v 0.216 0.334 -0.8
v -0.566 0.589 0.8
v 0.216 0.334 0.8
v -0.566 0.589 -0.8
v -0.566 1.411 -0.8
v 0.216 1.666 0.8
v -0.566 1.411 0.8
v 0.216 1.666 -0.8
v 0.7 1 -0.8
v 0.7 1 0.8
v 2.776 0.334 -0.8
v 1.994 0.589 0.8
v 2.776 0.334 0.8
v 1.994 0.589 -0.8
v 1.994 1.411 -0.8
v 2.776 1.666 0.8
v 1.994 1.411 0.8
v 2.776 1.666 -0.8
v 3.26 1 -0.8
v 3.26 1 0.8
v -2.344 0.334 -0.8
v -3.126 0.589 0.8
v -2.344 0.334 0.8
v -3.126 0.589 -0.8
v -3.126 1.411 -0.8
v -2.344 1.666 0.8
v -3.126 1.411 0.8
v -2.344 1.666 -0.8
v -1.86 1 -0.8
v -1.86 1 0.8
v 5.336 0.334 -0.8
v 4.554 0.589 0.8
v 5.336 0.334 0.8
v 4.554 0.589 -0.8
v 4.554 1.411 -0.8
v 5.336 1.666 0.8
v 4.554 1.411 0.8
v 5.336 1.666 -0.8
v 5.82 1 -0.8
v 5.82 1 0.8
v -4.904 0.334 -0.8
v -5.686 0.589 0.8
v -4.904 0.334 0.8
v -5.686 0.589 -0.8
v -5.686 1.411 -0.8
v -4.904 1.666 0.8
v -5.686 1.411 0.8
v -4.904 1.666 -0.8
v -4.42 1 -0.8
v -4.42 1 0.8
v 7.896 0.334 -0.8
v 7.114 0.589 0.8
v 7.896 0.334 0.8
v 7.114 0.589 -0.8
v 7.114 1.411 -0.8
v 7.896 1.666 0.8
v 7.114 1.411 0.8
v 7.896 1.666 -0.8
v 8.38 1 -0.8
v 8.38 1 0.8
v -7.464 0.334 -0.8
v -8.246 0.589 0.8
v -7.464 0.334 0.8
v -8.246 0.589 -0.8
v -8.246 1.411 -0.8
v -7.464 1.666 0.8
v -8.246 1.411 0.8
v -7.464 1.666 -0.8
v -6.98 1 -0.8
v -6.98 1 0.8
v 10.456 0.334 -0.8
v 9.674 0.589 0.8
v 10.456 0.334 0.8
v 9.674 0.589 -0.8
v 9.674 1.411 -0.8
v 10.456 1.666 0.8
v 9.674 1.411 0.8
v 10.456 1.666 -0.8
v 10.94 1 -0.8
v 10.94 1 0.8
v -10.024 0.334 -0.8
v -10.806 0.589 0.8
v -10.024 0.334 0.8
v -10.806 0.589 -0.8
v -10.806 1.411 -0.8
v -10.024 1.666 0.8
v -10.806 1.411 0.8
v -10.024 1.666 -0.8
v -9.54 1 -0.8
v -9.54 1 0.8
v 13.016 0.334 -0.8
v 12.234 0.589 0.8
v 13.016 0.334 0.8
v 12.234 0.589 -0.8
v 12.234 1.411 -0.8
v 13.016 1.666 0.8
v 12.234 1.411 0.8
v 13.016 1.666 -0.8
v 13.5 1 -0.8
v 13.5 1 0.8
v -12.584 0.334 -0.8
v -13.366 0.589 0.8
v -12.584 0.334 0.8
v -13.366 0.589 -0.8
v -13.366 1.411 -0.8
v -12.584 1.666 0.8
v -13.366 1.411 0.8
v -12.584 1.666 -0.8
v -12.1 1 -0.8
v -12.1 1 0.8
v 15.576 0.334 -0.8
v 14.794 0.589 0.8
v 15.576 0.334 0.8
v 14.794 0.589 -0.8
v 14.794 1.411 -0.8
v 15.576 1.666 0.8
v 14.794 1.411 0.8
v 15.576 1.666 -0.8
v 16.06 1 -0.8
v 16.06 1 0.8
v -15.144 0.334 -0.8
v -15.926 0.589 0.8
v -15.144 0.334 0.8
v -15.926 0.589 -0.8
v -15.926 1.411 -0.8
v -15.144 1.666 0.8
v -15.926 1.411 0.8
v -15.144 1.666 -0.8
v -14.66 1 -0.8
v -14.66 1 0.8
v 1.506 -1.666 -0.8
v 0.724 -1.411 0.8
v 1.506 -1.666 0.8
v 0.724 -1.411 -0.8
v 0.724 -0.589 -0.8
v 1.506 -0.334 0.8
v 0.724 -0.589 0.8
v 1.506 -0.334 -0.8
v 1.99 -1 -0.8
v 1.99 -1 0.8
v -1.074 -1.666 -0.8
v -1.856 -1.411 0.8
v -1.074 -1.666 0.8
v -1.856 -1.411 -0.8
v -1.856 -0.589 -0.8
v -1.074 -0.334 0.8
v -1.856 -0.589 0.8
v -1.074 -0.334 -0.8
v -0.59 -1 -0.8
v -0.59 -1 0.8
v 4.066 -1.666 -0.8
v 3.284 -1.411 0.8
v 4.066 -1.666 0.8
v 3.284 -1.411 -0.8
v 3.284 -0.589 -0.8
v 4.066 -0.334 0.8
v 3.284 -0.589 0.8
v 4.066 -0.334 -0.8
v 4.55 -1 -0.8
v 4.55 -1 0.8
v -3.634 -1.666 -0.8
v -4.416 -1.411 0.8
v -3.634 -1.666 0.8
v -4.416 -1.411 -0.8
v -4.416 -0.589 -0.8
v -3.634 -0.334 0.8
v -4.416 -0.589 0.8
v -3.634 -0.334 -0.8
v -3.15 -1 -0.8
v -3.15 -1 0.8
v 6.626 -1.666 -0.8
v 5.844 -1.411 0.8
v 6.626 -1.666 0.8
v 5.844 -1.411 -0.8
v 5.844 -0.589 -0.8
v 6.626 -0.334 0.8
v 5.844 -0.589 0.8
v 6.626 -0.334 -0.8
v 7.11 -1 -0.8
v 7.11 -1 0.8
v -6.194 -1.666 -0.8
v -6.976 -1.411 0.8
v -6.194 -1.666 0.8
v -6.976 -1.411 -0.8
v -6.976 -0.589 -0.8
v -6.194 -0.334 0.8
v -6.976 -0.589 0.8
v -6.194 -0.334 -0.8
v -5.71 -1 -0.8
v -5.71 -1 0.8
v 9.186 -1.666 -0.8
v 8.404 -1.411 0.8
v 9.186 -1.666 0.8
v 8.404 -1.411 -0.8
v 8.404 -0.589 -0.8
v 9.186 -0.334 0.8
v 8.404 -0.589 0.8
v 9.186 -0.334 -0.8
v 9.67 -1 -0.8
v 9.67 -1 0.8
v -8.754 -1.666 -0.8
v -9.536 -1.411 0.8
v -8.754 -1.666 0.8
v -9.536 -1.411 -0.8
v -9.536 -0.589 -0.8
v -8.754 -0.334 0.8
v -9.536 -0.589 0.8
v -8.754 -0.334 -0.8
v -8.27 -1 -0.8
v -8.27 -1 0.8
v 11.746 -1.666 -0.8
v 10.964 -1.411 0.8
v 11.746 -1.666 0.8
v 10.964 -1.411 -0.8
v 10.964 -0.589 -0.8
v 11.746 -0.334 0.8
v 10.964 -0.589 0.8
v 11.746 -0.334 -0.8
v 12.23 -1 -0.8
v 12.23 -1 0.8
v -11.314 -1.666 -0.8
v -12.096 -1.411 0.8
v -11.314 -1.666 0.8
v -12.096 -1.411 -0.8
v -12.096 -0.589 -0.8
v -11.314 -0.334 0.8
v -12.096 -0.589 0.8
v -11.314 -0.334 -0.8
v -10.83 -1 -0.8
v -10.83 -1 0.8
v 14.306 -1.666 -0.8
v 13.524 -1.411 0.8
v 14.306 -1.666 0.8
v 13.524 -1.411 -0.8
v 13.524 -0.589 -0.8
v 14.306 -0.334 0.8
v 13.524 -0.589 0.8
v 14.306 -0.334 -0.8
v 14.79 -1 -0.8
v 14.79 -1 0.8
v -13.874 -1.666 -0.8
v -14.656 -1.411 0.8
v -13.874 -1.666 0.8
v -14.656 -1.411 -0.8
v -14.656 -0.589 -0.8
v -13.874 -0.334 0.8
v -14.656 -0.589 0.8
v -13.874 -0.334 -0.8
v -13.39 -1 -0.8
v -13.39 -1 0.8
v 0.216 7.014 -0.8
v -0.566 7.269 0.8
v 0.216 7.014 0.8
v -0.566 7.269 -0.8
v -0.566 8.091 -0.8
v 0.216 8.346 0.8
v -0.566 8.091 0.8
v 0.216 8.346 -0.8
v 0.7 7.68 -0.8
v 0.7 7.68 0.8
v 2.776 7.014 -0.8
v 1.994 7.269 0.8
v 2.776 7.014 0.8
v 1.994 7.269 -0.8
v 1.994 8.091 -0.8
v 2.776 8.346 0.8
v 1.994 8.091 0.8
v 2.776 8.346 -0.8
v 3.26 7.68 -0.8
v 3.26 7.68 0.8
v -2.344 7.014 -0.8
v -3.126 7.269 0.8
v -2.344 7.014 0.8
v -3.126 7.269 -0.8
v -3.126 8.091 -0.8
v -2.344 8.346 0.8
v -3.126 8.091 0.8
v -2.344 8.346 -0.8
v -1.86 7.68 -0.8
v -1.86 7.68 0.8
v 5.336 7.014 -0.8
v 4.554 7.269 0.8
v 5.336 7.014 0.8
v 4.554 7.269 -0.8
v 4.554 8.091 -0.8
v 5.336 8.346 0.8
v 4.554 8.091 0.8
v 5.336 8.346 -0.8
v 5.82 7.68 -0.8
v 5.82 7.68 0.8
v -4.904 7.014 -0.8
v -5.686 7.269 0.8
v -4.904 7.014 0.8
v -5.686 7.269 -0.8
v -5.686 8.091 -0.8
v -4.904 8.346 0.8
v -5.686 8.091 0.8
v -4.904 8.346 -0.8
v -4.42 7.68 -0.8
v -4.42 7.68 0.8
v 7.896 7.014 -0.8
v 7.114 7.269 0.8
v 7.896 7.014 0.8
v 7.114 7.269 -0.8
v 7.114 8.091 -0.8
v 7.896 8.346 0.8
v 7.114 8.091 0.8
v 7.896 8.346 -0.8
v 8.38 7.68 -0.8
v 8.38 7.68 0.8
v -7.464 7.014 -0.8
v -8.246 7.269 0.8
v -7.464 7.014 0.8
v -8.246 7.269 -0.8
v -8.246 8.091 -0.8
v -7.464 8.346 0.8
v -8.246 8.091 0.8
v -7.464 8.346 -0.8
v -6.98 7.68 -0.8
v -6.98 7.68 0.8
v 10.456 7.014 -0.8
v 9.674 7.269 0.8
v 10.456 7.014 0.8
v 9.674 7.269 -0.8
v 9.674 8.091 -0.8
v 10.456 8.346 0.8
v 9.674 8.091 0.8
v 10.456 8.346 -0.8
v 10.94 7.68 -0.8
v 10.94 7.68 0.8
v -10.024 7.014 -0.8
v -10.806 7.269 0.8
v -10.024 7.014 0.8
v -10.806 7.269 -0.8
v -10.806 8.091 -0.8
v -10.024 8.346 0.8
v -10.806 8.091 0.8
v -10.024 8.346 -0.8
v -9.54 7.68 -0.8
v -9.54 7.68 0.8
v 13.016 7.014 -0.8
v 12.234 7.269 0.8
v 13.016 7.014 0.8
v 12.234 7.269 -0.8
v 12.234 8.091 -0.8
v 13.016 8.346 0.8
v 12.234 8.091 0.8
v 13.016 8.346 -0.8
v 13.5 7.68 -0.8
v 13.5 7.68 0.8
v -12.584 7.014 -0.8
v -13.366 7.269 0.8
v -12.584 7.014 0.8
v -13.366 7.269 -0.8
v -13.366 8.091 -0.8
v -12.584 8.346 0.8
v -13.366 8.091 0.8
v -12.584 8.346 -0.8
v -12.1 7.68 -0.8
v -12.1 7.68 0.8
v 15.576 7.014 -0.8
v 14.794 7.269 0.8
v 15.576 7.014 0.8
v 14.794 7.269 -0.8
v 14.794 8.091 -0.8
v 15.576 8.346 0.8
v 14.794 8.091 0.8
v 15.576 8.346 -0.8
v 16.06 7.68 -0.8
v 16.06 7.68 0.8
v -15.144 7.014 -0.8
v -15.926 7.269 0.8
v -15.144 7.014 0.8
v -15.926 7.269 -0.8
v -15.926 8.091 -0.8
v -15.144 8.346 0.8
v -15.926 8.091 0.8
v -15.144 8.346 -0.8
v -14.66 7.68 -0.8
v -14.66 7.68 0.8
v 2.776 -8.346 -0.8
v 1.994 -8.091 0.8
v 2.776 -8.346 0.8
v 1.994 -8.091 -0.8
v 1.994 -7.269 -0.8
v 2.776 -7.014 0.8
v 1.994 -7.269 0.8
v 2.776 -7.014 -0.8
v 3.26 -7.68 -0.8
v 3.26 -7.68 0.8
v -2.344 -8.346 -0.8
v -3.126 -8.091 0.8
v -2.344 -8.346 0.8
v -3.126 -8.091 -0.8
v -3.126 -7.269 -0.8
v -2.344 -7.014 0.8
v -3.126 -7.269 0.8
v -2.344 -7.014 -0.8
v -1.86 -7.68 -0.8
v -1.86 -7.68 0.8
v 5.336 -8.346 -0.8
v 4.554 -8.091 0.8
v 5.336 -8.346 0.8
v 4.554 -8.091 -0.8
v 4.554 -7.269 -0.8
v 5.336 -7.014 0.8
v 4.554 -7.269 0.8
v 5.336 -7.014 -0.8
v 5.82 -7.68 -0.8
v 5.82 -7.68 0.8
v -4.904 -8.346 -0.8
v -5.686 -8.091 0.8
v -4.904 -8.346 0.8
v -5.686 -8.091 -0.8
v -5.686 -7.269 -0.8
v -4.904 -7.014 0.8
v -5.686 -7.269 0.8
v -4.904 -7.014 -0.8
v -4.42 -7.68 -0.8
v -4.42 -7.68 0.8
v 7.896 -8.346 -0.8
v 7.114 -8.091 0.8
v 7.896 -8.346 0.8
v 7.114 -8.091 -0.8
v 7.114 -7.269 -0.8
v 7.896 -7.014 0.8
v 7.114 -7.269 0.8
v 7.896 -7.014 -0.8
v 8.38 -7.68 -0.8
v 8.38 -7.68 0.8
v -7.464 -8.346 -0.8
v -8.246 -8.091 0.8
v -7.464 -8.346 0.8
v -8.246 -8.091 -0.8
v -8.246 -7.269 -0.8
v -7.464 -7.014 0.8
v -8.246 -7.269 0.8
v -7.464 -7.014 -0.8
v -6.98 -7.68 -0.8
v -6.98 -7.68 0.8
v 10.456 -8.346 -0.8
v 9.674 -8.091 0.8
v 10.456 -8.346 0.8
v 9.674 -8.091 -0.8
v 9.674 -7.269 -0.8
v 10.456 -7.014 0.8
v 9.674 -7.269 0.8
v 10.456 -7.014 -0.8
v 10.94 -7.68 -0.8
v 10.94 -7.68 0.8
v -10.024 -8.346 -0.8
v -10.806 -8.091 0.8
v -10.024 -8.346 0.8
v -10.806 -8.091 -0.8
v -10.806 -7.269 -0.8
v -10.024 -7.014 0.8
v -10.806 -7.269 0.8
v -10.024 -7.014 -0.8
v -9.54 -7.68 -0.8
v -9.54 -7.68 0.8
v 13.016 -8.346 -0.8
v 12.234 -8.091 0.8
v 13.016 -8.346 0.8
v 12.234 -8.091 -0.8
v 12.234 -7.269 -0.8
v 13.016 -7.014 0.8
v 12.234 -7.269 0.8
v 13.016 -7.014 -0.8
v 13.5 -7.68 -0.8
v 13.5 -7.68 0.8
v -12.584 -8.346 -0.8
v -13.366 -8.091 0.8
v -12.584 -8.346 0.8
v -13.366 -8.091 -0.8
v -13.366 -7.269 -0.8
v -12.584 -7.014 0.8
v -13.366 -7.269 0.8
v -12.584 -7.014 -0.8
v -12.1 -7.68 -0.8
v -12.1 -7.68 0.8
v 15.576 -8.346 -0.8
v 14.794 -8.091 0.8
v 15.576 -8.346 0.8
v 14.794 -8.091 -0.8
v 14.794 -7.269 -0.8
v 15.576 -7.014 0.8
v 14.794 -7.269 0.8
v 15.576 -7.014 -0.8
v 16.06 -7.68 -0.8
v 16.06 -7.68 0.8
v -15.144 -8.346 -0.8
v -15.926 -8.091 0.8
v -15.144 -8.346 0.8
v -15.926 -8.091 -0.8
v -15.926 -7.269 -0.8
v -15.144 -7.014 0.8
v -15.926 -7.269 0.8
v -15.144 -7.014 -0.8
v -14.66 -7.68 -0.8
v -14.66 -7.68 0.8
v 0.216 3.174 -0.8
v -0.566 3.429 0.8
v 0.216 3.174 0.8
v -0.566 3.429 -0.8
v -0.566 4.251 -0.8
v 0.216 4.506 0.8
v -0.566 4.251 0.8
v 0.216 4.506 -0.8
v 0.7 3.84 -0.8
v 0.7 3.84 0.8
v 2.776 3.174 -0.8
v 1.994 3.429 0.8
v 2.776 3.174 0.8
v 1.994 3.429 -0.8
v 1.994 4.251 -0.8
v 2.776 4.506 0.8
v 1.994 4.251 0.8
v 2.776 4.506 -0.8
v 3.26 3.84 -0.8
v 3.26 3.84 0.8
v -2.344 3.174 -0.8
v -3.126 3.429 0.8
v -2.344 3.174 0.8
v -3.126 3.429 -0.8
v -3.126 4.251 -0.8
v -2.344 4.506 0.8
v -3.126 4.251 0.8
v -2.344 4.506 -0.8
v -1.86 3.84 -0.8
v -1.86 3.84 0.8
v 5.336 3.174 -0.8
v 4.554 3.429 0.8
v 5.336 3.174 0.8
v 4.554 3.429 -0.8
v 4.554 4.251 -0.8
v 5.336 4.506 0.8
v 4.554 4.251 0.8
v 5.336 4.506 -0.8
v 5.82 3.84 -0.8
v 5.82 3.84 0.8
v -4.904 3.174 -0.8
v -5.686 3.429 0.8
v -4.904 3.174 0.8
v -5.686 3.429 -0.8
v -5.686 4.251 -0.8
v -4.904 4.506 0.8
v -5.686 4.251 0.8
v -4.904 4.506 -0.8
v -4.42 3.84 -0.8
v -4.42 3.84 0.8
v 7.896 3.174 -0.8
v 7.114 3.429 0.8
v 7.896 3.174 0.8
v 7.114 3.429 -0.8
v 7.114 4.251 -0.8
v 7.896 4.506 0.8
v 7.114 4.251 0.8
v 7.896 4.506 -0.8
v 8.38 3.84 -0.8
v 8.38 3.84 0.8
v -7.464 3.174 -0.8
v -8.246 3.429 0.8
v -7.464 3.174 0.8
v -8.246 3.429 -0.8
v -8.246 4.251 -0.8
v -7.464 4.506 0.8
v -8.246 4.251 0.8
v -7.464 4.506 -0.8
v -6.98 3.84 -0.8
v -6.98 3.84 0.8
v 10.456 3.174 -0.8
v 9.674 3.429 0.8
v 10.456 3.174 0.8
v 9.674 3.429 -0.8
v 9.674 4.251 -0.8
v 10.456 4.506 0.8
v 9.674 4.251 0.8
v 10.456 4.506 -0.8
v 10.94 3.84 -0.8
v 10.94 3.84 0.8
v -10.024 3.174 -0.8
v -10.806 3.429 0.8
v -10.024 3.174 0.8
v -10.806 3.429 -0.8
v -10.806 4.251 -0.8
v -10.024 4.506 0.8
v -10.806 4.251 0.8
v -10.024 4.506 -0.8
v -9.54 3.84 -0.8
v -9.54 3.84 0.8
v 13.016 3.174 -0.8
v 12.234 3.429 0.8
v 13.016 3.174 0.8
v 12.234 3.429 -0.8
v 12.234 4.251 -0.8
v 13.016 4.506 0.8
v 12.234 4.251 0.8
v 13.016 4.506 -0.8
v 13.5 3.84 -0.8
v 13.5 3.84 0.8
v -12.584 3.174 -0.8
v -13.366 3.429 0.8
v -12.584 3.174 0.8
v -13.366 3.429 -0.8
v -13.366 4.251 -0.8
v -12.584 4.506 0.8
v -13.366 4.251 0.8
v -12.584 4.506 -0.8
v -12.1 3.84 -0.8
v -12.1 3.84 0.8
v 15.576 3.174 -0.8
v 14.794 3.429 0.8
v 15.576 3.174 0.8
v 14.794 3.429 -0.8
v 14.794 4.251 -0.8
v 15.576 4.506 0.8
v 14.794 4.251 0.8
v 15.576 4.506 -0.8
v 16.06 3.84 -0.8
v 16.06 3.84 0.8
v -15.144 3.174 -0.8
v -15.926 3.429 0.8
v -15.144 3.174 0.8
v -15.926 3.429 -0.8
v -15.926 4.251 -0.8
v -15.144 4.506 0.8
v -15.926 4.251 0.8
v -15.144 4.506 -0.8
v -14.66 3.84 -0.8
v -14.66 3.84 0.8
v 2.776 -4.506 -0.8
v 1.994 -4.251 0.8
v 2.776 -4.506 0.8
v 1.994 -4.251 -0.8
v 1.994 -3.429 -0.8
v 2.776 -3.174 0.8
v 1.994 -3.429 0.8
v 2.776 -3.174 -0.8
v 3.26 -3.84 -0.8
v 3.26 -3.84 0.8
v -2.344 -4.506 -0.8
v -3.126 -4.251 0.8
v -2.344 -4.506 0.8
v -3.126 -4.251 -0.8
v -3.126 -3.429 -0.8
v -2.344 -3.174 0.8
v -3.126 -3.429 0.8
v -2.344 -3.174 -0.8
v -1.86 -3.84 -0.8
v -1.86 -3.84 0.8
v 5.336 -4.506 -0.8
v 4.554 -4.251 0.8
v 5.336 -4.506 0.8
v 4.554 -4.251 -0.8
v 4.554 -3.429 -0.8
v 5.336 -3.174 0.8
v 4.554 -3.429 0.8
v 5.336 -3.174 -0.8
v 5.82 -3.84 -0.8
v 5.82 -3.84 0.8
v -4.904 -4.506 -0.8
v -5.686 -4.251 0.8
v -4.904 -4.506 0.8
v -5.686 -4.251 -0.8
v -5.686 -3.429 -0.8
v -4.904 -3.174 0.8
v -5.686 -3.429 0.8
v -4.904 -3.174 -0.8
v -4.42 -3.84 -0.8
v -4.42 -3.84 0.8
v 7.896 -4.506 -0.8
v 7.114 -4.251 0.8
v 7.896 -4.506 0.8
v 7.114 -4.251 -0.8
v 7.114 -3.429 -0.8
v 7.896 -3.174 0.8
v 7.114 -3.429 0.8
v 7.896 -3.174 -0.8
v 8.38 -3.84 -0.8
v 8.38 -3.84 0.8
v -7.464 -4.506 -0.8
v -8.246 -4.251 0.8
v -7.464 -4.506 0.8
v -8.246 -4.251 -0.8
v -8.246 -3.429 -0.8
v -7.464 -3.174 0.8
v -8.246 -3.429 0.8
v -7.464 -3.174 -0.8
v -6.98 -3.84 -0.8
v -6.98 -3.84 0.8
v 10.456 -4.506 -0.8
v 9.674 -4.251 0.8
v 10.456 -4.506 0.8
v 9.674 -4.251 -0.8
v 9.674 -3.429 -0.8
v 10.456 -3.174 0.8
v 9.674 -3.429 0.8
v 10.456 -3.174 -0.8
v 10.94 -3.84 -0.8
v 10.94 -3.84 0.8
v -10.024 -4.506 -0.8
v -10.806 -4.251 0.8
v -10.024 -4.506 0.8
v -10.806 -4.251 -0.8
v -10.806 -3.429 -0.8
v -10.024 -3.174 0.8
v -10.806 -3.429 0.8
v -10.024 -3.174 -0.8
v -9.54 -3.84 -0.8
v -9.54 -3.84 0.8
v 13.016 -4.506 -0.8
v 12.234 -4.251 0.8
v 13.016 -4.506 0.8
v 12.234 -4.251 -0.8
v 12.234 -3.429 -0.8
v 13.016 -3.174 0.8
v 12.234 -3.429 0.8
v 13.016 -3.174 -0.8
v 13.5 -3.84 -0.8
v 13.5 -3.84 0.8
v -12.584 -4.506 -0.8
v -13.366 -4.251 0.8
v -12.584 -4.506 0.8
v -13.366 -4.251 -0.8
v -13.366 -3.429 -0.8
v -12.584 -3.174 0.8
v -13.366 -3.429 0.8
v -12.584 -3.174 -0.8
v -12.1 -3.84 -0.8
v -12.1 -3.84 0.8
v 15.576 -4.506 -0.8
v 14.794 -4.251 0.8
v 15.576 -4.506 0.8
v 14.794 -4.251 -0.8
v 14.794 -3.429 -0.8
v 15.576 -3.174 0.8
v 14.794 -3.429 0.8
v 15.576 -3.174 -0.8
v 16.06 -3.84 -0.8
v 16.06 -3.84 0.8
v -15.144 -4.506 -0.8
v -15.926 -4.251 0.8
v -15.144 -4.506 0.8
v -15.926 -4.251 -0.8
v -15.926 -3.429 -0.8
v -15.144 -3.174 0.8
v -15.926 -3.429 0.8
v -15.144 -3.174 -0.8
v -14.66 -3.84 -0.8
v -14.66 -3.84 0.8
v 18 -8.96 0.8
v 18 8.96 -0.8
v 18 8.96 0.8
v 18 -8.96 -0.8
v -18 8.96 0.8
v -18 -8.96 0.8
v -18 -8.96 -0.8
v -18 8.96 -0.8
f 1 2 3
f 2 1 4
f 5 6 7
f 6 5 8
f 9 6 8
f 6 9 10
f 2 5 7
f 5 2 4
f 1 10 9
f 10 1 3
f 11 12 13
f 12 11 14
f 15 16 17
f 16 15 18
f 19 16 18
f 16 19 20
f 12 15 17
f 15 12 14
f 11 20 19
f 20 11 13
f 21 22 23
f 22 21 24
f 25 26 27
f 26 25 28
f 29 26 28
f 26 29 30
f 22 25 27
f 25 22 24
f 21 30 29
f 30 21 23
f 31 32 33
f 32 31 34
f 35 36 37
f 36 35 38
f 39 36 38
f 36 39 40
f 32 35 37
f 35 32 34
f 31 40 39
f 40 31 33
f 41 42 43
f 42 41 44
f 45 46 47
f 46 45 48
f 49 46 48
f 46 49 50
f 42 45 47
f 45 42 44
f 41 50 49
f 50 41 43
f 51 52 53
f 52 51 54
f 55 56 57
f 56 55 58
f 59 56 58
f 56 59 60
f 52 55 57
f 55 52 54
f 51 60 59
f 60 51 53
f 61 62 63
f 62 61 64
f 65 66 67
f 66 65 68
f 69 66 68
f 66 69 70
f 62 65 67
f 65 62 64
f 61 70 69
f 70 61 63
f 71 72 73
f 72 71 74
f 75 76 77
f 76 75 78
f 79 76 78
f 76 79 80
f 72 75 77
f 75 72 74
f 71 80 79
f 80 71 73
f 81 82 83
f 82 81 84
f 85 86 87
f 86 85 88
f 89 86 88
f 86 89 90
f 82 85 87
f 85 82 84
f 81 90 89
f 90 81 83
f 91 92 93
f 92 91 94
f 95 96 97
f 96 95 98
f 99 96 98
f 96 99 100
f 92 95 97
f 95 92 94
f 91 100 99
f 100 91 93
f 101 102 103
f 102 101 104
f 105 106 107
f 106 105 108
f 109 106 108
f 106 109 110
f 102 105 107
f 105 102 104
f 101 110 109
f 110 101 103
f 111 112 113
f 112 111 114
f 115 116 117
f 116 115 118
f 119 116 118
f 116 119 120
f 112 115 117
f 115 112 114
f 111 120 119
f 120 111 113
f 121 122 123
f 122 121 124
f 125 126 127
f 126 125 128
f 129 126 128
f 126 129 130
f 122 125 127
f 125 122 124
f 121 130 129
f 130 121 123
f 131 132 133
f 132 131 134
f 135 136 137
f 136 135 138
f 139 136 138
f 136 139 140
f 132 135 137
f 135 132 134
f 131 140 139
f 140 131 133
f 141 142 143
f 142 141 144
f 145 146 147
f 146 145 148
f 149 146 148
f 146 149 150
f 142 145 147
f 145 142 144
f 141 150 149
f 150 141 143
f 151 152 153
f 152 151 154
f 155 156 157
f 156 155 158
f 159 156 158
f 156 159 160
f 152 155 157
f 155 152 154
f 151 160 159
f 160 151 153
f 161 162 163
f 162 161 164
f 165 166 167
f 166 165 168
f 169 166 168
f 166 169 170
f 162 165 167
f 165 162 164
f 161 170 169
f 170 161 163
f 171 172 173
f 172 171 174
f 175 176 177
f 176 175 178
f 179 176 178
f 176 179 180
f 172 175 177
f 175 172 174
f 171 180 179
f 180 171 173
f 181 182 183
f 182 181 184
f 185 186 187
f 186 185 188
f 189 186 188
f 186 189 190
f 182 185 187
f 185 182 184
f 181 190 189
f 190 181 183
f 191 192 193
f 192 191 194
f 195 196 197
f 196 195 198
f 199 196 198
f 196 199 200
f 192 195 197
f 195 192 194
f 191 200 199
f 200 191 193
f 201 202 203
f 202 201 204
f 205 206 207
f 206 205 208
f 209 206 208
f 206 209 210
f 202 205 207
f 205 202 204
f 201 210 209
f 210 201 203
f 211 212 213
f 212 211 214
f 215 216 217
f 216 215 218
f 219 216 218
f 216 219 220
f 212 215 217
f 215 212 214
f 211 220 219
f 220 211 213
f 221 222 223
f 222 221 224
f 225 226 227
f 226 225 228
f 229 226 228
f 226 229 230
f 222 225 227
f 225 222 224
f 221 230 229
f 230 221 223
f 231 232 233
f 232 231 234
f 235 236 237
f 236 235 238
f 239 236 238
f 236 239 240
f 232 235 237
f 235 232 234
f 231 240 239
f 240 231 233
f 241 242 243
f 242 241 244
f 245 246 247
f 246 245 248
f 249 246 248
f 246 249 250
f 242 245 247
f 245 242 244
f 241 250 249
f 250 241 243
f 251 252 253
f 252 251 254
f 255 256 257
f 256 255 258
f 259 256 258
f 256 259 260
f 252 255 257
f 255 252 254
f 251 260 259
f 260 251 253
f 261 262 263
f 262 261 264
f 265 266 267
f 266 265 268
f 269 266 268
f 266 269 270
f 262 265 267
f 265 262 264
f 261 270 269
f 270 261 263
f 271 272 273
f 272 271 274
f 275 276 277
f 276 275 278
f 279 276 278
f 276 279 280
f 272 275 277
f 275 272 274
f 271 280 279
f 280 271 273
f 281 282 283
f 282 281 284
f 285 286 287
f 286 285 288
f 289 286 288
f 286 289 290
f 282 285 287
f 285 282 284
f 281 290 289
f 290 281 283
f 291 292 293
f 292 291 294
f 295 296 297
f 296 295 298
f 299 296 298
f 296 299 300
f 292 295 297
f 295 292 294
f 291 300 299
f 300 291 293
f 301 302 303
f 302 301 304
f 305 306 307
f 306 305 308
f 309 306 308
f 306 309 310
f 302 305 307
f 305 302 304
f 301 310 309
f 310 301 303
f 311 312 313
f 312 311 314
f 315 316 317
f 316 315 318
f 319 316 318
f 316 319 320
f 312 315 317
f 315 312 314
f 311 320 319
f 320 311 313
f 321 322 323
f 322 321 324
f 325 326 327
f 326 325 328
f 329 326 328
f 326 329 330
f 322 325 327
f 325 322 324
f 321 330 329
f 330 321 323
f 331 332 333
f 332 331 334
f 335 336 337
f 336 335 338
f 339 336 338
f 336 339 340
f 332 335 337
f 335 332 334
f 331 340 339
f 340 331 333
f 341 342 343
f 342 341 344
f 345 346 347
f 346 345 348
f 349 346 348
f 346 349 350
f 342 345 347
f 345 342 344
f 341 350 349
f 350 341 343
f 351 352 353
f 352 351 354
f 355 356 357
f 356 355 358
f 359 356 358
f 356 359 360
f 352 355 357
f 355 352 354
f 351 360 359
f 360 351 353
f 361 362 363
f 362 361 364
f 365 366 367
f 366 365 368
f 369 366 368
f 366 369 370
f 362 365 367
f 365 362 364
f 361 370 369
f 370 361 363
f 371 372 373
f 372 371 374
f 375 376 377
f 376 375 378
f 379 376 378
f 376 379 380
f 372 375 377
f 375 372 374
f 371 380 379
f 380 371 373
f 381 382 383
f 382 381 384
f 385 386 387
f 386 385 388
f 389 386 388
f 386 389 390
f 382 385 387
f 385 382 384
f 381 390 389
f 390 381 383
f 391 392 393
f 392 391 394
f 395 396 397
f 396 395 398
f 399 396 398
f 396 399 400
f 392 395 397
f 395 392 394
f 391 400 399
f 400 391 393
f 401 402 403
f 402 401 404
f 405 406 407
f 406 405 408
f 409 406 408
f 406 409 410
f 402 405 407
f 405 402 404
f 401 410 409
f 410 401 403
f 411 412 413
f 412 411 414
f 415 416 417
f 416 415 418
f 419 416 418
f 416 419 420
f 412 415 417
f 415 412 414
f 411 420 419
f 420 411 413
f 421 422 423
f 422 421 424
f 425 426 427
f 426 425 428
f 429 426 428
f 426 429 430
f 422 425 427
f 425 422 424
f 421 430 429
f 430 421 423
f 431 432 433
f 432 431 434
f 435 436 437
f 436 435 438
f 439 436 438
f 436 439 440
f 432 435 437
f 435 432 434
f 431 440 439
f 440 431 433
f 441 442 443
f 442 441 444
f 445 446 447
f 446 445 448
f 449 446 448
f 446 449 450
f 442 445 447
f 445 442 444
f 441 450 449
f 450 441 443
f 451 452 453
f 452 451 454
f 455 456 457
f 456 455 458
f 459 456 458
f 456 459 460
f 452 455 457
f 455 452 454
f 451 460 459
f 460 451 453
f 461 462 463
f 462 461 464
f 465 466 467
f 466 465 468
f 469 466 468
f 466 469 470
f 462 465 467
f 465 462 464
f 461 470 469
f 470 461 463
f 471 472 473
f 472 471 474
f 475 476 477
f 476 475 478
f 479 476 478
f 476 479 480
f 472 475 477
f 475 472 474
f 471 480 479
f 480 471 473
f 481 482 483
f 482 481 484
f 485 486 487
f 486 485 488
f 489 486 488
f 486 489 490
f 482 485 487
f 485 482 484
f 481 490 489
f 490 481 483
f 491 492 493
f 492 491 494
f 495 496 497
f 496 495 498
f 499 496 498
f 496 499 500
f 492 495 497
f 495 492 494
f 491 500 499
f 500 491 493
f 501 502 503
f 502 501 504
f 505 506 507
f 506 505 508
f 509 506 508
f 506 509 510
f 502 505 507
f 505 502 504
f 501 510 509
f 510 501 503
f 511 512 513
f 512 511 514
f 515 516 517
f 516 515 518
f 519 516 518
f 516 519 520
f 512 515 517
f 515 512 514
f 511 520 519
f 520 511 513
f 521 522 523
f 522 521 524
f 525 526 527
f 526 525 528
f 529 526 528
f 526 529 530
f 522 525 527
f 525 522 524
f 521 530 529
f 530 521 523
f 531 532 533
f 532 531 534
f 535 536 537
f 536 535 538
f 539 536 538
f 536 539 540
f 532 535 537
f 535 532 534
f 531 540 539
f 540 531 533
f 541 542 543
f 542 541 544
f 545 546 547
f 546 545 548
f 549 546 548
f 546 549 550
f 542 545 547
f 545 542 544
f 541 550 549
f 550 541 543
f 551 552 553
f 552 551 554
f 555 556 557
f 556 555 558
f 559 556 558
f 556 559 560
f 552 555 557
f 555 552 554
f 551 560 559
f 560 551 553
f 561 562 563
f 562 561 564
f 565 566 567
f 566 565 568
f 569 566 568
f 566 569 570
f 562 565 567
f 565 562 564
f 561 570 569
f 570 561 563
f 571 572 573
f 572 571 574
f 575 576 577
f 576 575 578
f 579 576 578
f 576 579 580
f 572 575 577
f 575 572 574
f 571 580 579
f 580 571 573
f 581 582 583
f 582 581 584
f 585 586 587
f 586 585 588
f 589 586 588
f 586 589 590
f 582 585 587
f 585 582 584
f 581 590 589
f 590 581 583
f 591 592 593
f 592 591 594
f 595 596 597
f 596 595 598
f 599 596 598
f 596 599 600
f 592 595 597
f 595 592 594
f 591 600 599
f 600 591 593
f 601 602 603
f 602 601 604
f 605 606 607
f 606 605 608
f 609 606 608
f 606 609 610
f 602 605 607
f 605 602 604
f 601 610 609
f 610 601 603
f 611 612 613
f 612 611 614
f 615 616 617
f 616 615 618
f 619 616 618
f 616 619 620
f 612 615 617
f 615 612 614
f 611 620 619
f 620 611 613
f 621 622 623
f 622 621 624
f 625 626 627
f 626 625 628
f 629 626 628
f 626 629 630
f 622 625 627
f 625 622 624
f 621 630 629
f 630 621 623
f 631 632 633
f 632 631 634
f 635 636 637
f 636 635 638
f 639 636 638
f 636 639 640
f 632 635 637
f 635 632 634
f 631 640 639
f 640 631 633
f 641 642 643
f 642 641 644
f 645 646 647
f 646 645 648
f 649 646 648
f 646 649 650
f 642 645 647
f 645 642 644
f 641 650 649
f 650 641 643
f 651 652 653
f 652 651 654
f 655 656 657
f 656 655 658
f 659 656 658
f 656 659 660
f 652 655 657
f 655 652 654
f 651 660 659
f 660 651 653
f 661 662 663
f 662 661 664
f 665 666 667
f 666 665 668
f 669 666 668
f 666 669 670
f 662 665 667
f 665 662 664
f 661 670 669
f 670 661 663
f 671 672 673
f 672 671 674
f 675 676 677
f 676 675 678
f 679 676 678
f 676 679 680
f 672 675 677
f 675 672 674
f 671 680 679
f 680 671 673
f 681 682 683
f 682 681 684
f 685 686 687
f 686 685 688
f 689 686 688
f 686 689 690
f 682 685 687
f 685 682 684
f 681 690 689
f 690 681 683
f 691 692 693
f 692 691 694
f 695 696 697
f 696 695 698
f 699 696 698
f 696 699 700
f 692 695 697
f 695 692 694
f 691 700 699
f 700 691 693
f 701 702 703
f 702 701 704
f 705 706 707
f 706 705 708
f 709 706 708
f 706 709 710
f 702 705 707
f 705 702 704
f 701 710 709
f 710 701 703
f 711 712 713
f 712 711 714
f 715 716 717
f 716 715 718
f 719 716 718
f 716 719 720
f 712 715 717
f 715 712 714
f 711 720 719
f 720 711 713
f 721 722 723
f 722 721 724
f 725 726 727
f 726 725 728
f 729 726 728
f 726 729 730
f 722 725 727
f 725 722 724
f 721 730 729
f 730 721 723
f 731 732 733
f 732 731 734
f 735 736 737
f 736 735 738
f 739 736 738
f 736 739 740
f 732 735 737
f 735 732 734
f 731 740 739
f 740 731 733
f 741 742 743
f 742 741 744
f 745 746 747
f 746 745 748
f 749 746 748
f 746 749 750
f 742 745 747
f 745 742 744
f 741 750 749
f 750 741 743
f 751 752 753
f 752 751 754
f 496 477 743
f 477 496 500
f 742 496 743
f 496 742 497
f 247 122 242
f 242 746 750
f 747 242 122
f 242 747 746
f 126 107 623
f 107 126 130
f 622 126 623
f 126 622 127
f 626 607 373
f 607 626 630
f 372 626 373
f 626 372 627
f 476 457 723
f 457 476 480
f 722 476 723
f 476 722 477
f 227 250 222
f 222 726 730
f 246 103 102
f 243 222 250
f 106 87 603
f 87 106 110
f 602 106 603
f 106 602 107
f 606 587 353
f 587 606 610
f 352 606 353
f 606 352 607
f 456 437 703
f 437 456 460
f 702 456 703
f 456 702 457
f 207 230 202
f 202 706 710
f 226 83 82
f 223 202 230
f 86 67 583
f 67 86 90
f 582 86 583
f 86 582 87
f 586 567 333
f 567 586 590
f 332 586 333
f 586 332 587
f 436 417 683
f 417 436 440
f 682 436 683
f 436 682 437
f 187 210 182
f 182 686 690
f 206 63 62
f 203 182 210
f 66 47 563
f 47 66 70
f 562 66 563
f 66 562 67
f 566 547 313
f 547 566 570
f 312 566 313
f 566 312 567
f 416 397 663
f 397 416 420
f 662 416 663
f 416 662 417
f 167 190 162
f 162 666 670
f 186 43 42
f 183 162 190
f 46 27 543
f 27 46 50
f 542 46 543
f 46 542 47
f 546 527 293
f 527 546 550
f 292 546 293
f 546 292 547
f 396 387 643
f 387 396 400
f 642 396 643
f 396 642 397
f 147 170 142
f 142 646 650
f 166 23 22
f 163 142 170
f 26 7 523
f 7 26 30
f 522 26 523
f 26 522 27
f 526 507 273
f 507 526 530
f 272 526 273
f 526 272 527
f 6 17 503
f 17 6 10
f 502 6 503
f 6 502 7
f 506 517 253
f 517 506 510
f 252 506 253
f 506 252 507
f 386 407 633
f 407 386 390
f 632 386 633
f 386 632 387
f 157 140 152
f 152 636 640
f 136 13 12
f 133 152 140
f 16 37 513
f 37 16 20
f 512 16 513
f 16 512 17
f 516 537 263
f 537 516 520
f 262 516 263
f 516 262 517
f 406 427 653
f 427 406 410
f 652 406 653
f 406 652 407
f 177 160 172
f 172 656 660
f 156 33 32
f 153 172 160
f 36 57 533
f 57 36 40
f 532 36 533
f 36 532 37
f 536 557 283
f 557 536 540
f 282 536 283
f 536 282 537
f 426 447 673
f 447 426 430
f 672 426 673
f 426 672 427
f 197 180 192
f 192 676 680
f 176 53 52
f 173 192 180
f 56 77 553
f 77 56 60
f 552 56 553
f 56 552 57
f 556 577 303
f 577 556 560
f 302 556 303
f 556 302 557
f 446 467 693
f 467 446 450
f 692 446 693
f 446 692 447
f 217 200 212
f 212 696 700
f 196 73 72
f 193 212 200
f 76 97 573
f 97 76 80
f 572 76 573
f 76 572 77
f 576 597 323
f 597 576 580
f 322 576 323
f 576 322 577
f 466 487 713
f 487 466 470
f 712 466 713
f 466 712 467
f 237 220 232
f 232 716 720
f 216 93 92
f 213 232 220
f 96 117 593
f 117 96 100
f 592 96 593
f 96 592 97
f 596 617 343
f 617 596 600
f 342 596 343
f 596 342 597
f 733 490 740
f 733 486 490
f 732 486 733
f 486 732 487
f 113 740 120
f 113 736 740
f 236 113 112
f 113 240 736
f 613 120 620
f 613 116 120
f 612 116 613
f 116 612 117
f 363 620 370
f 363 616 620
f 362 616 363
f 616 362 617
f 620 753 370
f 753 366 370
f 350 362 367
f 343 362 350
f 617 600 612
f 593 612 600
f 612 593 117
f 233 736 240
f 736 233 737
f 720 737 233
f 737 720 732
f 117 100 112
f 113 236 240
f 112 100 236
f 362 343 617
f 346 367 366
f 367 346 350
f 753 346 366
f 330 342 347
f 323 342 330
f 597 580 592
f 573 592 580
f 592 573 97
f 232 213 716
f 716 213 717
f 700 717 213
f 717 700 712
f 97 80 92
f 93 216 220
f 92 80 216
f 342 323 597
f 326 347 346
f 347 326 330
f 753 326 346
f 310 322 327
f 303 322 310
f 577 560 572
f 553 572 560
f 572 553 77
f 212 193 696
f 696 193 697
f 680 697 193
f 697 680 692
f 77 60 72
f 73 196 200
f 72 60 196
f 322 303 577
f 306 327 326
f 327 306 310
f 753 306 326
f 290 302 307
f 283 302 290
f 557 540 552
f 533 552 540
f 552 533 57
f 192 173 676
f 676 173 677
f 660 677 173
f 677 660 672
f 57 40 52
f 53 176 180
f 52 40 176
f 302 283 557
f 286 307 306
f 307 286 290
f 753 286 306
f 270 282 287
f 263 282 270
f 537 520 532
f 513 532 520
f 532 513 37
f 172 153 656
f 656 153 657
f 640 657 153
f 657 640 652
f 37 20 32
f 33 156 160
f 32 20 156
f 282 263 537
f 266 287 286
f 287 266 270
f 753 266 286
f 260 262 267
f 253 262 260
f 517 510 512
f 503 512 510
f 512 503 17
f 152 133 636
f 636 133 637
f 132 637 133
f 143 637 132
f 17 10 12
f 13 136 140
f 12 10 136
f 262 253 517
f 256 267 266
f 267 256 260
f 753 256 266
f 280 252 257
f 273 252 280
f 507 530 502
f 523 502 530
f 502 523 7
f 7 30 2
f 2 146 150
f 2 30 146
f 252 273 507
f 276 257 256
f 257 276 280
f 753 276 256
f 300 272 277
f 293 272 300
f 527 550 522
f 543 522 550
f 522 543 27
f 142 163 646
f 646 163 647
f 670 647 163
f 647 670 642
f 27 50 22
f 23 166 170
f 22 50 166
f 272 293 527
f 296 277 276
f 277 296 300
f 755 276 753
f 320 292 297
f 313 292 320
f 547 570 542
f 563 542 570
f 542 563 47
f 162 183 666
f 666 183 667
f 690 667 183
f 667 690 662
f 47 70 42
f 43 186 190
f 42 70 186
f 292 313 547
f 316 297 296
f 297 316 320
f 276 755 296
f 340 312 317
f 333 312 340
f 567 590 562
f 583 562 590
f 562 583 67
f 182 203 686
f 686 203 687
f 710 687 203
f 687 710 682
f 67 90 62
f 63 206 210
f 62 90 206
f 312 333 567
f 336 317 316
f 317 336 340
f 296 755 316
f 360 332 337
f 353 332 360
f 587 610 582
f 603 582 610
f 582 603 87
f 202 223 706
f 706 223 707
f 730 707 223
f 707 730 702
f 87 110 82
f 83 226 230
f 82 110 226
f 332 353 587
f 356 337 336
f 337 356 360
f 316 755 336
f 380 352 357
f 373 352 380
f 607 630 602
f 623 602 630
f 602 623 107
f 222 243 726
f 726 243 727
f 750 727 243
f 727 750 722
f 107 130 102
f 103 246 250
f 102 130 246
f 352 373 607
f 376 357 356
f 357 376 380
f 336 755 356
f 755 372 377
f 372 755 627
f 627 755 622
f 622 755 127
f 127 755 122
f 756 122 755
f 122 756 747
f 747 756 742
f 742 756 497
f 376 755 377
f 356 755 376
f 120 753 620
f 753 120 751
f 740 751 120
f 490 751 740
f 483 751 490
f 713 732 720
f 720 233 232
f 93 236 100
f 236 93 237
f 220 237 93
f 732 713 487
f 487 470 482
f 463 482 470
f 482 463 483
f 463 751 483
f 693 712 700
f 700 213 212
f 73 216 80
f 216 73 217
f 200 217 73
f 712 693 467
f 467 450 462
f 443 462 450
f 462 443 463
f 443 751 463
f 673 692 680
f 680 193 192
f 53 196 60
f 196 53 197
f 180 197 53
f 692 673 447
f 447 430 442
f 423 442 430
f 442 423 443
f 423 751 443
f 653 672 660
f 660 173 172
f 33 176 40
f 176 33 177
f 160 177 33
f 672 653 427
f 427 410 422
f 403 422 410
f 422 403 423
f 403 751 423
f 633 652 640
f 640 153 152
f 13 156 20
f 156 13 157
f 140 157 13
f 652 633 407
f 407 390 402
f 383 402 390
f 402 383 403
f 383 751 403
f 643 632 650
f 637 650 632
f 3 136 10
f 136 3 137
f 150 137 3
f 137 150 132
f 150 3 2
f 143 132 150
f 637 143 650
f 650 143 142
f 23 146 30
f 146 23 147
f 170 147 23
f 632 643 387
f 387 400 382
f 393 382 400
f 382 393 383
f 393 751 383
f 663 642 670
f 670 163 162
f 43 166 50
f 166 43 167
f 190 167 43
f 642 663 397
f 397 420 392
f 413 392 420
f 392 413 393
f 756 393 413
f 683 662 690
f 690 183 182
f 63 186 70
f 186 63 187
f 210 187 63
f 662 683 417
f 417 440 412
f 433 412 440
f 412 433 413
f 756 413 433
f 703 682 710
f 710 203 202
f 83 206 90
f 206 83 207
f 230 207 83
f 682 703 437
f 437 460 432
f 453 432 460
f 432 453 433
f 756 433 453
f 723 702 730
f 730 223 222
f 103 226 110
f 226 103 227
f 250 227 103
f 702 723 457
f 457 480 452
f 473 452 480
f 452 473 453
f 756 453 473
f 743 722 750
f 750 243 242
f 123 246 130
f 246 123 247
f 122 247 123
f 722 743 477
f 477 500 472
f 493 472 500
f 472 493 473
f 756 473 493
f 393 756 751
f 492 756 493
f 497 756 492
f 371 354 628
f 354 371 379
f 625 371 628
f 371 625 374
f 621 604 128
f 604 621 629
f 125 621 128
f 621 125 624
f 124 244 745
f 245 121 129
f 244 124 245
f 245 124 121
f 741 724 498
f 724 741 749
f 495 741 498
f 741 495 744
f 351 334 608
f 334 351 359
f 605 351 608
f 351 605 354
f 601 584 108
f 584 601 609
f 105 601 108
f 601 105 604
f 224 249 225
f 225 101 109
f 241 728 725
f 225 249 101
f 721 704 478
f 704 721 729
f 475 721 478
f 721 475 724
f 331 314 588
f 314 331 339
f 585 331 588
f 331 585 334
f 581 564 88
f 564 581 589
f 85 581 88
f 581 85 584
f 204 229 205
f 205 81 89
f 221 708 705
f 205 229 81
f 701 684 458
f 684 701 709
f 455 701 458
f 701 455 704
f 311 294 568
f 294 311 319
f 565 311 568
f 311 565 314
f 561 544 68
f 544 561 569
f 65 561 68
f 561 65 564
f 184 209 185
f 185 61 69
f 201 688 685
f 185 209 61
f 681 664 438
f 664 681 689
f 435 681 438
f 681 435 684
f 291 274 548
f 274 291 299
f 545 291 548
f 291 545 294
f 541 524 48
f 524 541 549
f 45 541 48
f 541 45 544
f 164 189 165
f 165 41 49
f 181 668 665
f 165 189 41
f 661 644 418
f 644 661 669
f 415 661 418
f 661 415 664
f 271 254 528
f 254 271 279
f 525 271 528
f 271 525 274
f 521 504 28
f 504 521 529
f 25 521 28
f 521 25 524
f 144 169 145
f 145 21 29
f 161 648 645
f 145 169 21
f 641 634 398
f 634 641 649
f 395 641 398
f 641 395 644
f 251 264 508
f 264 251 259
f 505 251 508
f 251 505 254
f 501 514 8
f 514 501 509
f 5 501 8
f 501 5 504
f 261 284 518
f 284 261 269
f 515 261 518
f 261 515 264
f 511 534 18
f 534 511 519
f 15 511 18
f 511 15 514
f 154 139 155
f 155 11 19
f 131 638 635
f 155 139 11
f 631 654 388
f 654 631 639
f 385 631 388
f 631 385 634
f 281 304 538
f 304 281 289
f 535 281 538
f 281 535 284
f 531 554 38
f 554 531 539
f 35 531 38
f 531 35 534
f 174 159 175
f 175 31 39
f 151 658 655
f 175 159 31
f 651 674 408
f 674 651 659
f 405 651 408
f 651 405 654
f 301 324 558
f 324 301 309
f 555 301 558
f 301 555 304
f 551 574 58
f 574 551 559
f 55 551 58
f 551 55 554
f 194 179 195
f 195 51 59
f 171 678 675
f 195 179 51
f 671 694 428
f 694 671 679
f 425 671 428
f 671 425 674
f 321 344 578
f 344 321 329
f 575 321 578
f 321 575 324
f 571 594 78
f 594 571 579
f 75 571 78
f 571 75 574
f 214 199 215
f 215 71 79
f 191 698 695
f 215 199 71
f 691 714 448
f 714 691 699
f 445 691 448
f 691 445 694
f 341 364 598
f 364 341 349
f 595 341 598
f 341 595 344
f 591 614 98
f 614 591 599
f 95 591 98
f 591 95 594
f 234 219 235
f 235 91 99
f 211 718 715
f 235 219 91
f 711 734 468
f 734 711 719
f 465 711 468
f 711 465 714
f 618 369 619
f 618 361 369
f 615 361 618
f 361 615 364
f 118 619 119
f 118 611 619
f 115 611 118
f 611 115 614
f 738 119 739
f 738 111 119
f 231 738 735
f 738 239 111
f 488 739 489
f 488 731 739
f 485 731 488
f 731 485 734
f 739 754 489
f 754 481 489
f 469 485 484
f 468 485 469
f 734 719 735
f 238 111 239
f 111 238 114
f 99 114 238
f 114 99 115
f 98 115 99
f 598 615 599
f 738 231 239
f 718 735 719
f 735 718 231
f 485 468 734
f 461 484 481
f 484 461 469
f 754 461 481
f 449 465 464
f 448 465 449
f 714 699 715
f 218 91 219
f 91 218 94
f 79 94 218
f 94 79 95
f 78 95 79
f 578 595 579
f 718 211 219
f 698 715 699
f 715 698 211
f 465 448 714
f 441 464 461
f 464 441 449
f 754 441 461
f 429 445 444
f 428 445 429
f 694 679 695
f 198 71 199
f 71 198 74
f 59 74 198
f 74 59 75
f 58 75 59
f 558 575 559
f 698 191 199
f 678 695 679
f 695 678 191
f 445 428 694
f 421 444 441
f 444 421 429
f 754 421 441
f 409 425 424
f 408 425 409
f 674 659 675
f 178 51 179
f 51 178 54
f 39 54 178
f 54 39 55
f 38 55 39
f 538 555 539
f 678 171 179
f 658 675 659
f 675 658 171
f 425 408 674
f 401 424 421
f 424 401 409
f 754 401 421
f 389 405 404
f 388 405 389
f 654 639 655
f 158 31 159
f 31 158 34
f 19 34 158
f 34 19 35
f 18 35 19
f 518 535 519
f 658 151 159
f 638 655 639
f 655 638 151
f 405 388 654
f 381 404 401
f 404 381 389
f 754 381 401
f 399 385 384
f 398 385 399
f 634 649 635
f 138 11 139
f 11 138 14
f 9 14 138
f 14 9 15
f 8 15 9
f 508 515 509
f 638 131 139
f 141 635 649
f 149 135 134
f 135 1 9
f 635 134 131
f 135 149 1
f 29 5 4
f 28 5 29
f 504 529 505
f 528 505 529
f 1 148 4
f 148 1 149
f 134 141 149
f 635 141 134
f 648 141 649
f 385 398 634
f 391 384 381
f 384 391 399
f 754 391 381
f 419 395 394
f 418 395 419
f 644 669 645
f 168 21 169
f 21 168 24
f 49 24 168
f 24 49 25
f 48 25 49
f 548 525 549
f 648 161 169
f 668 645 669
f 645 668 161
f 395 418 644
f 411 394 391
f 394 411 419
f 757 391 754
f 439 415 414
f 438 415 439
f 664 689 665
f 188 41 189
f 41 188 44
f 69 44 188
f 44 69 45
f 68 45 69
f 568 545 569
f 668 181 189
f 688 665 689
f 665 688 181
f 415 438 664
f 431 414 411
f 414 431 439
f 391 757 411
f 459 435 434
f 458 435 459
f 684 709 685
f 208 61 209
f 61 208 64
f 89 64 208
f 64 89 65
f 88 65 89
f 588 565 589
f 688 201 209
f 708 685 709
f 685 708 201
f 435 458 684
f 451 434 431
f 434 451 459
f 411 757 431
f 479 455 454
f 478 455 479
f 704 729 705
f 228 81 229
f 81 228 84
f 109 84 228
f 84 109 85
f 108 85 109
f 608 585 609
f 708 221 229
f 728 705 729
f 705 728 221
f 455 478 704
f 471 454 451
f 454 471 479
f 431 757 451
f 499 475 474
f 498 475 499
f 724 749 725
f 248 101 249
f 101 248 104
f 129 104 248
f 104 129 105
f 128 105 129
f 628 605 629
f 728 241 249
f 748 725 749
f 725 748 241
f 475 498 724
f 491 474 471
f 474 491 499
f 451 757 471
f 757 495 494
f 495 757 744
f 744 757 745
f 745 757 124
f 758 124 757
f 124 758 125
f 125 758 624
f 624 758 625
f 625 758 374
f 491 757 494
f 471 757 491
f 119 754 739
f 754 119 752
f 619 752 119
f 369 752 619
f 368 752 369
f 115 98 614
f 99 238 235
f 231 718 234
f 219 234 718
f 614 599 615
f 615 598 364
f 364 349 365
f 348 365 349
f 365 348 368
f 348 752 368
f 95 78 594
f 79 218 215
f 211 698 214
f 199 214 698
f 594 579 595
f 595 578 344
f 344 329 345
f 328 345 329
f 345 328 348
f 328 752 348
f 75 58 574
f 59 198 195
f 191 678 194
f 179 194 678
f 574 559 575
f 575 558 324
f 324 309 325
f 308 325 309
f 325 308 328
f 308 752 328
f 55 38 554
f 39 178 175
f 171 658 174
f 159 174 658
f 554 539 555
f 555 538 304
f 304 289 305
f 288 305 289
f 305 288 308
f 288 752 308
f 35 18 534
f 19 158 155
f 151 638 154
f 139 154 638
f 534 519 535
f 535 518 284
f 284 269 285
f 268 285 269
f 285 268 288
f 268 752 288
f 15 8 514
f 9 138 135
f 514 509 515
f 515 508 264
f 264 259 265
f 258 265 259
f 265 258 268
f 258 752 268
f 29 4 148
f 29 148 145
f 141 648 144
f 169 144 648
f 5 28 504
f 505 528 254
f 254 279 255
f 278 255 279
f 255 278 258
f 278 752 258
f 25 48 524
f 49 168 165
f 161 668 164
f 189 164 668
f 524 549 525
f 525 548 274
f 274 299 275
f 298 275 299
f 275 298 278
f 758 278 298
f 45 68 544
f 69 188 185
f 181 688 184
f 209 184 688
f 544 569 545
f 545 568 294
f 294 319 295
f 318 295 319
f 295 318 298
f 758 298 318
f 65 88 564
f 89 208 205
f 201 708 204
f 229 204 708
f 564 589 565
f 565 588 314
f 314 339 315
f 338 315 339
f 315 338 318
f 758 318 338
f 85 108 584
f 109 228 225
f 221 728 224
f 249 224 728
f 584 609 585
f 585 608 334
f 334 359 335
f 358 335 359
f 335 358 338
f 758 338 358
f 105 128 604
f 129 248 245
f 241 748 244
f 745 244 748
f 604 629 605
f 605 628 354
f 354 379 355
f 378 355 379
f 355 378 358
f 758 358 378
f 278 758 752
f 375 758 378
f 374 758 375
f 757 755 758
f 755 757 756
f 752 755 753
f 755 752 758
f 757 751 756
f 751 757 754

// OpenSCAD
lochradius=0.7;
difference() {
	translate([0,0,0]) cube([36, 7*2.56, 1.6], center=true);
	for(i = [0:1:6]) {
		translate([i*2.56,1,0]) cylinder(h=3, r=lochradius, center=true);
	translate([-i*2.56,1,0]) cylinder(h=3, r=lochradius, center=true);
	}
	for(i = [1:1:6]) {
		translate([i*2.56-1.27,-1,0]) cylinder(h=3, r=lochradius, center=true);
	translate([-i*2.56+1.27,-1,0]) cylinder(h=3, r=lochradius, center=true);
	}
	for(i = [0:1:6]) {
		translate([i*2.56,3*2.56,0]) cylinder(h=3, r=lochradius, center=true);
	translate([-i*2.56,3*2.56,0]) cylinder(h=3, r=lochradius, center=true);
	}
	for(i = [1:1:6]) {
		translate([i*2.56,-3*2.56,0]) cylinder(h=3, r=lochradius, center=true);
	translate([-i*2.56,-3*2.56,0]) cylinder(h=3, r=lochradius, center=true);
	}
	for(i = [0:1:6]) {
		translate([i*2.56,1.5*2.56,0]) cylinder(h=3, r=lochradius, center=true);
	translate([-i*2.56,1.5*2.56,0]) cylinder(h=3, r=lochradius, center=true);
	}
	for(i = [1:1:6]) {
		translate([i*2.56,-1.5*2.56,0]) cylinder(h=3, r=lochradius, center=true);
	translate([-i*2.56,-1.5*2.56,0]) cylinder(h=3, r=lochradius, center=true);
	}
}
